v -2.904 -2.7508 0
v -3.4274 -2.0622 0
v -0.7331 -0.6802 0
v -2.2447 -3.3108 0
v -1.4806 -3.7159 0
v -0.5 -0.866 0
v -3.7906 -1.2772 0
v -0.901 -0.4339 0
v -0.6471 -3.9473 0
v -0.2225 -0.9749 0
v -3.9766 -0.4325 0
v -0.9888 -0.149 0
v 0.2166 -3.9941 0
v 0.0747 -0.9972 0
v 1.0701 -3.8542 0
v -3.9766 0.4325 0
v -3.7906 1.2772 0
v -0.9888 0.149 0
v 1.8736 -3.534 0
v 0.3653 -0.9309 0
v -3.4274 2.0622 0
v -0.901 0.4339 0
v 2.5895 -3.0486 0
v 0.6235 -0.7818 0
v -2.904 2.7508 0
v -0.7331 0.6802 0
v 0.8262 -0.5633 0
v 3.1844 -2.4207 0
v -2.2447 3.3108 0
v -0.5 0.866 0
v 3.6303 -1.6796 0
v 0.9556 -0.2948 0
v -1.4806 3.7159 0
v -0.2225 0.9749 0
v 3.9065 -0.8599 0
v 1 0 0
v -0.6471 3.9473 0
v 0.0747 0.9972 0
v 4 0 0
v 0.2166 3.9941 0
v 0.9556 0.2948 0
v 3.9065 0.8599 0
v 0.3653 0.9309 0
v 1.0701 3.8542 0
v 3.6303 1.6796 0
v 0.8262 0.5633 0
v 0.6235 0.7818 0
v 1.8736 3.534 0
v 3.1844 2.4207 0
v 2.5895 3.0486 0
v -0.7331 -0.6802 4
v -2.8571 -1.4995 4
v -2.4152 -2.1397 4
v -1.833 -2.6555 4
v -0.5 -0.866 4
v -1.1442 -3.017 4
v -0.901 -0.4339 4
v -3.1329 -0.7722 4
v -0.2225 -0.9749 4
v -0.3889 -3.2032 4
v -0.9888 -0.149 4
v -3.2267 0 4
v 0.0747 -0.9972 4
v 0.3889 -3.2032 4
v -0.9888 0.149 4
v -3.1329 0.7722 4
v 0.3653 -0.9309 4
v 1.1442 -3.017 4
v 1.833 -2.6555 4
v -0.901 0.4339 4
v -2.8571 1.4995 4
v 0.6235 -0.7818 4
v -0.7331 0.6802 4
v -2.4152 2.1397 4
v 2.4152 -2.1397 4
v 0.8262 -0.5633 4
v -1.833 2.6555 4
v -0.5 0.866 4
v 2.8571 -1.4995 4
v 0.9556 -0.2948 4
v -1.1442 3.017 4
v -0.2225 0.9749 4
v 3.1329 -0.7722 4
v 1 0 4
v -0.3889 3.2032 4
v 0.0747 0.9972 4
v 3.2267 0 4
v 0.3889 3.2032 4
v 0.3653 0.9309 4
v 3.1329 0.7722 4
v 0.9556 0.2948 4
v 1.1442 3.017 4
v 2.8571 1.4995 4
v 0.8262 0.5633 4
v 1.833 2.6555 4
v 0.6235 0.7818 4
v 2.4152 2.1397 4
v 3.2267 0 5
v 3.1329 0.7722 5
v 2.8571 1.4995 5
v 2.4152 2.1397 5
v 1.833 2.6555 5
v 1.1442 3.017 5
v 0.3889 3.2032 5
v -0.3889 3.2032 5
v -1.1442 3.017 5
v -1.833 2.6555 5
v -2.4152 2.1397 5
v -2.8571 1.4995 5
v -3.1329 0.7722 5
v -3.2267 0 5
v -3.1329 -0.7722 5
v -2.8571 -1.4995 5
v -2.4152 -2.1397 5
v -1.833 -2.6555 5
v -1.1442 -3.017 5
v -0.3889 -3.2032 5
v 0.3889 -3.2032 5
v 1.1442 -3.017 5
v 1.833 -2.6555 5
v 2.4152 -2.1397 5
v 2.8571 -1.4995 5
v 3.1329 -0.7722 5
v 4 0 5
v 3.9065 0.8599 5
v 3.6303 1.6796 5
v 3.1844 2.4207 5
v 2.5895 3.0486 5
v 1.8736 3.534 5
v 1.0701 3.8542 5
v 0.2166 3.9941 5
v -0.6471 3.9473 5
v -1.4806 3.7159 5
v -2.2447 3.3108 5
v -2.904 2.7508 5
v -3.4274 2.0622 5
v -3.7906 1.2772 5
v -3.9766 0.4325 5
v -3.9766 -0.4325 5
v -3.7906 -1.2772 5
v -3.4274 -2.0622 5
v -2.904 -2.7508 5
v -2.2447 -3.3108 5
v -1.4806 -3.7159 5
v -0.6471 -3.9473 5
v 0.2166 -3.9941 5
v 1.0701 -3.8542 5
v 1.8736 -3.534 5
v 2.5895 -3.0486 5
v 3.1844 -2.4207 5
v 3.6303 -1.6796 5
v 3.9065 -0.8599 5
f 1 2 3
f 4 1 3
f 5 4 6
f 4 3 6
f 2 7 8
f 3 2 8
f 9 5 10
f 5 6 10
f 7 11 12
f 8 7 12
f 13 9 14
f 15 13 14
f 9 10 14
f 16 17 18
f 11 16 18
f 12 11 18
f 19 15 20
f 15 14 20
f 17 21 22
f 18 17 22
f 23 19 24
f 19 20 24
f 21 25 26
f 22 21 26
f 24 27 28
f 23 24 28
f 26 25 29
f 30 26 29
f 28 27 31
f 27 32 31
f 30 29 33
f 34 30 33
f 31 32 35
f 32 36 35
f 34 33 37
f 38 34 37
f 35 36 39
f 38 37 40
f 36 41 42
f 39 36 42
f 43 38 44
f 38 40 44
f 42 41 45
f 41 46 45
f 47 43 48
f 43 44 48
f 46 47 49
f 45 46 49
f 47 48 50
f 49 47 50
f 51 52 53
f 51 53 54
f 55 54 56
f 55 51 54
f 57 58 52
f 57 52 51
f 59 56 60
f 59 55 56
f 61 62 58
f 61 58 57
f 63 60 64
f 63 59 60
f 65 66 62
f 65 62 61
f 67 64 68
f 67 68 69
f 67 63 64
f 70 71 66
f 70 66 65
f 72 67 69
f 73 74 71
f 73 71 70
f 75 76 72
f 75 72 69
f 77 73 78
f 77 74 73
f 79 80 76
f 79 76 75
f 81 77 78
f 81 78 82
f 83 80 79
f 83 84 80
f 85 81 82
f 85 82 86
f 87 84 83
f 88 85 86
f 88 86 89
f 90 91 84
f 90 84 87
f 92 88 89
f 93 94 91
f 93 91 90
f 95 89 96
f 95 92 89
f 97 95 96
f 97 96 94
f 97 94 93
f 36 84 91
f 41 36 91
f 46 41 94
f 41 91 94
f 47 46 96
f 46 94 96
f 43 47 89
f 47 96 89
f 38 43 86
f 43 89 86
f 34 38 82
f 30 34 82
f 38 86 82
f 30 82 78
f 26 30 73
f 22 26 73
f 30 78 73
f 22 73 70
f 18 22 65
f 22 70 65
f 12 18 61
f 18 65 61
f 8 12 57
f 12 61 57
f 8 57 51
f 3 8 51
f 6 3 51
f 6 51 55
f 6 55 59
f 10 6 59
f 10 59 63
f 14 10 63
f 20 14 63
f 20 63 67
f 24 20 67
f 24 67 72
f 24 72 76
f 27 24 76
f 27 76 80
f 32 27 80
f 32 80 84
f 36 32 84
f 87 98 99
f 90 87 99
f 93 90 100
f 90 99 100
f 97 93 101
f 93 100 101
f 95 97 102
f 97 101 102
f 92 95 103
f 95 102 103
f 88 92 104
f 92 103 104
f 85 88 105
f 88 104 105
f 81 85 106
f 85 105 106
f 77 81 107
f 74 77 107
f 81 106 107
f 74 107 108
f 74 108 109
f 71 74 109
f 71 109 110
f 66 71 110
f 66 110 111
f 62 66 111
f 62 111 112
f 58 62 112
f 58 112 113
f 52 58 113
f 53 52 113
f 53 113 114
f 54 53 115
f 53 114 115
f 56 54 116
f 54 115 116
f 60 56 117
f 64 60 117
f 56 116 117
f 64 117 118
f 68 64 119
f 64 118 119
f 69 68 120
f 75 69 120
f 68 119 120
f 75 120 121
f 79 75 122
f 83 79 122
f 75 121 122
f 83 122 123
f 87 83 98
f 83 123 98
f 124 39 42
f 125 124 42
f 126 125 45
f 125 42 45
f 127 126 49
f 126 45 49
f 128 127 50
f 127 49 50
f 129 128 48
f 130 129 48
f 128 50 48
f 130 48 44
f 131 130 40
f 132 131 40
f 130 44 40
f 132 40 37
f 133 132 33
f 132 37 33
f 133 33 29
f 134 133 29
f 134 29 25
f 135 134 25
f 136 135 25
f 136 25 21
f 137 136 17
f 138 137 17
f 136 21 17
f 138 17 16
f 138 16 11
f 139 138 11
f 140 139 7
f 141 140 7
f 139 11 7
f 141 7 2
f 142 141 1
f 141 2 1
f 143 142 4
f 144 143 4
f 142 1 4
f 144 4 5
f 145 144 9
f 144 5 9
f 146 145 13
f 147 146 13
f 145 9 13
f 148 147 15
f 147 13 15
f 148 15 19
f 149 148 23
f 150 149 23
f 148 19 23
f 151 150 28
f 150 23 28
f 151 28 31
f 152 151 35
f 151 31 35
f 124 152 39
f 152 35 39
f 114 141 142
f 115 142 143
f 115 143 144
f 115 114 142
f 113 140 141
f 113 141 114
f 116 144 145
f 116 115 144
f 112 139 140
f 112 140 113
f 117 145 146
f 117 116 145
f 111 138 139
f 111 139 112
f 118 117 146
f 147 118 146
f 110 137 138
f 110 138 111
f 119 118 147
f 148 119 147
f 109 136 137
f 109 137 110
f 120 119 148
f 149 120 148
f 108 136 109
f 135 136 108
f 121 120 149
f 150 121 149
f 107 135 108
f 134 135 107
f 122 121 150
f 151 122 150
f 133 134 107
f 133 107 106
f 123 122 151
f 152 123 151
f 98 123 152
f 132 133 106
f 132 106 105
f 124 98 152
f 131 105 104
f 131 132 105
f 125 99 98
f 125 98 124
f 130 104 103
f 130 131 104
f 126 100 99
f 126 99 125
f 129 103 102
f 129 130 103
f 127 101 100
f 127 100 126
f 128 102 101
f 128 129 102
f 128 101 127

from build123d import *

# Parameters (mm, degrees)
F0_R     = 4
F1_DEPTH = 5
F2_R     = 3.226703
F3_DEPTH = 1
F4_R     = 1
F5_DEPTH = 4.001


with BuildPart() as f1:
    # F0 (on Top) → F1 (new body)
    with BuildSketch(Plane.XY):
        Circle(F0_R)
    extrude(amount=F1_DEPTH)

    # F2 (on face) → F3 (cut)
    with BuildSketch(Plane.XY.offset(5)):
        Circle(F2_R)
    extrude(amount=-F3_DEPTH, mode=Mode.SUBTRACT)

    # F4 (on face) → F5 (cut, through all)
    with BuildSketch(Plane.XY.offset(4)):
        Circle(F4_R)
    extrude(amount=-F5_DEPTH, mode=Mode.SUBTRACT)


solid = f1.part
